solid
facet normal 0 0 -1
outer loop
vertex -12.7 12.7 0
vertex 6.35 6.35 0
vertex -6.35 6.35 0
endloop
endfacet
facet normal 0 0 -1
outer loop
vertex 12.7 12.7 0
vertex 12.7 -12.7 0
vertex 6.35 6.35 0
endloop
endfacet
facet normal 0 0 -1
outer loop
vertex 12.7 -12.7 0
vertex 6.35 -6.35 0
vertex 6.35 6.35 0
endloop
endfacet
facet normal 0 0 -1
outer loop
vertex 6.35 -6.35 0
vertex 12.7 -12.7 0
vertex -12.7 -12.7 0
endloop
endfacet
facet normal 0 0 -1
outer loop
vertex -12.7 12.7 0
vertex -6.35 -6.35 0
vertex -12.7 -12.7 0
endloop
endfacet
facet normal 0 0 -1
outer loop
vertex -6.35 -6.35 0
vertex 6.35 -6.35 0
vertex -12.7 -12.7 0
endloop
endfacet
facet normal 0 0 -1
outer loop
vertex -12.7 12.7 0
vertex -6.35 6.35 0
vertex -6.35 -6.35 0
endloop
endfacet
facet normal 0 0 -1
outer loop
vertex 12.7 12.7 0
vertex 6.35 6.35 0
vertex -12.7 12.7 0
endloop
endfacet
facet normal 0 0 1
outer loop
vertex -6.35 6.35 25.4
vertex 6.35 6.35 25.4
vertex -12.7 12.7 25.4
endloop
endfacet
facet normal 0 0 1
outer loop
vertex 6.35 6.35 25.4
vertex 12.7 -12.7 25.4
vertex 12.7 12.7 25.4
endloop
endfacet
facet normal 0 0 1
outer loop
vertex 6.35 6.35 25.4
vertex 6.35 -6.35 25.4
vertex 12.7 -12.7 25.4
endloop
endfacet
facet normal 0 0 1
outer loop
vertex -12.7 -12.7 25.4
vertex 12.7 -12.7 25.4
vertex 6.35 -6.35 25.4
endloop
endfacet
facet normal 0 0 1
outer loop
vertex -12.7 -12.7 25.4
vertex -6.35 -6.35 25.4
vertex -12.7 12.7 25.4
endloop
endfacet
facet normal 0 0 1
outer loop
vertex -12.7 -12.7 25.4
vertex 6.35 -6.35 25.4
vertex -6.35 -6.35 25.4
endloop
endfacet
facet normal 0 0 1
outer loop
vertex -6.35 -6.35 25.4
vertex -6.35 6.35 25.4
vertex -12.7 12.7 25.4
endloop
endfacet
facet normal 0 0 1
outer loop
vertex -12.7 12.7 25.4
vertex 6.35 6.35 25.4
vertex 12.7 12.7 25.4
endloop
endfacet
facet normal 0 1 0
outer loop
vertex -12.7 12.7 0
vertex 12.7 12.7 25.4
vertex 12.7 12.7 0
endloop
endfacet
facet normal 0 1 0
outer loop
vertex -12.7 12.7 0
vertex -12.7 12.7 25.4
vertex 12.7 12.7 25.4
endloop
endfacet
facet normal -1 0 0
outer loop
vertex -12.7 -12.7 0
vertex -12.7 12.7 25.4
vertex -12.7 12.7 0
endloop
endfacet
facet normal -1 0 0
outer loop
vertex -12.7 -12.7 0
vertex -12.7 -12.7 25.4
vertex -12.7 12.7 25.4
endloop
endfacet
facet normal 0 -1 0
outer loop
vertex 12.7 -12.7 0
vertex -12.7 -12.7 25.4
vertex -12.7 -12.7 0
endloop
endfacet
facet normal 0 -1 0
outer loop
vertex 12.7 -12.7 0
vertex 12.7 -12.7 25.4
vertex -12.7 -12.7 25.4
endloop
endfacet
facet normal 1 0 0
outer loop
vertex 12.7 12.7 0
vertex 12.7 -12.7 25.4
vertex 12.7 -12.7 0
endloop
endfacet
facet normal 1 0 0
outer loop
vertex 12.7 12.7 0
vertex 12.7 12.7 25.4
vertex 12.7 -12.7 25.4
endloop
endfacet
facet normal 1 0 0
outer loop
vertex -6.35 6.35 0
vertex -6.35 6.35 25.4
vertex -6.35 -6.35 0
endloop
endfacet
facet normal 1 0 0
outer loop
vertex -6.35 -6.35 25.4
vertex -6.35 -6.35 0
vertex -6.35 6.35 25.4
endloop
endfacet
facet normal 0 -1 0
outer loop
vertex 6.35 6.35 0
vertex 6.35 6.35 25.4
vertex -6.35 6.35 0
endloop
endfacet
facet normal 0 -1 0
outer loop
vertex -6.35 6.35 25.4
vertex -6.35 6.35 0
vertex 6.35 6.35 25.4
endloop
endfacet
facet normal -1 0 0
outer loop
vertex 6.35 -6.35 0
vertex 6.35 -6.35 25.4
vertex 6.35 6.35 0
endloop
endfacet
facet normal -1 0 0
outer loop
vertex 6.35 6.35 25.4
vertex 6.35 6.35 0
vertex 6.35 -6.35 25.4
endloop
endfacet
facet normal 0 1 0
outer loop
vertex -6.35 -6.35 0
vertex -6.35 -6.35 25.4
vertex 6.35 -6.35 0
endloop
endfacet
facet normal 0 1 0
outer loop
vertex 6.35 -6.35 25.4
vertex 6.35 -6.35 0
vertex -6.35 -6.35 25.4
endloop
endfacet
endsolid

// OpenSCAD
ViewScale = [0.0254, 0.0254, 0.0254];
scale(ViewScale)
{
    linear_extrude(1000)
    difference() {
    square([1000, 1000], center=true);
    square([500, 500], center=true);
    }
}
   
